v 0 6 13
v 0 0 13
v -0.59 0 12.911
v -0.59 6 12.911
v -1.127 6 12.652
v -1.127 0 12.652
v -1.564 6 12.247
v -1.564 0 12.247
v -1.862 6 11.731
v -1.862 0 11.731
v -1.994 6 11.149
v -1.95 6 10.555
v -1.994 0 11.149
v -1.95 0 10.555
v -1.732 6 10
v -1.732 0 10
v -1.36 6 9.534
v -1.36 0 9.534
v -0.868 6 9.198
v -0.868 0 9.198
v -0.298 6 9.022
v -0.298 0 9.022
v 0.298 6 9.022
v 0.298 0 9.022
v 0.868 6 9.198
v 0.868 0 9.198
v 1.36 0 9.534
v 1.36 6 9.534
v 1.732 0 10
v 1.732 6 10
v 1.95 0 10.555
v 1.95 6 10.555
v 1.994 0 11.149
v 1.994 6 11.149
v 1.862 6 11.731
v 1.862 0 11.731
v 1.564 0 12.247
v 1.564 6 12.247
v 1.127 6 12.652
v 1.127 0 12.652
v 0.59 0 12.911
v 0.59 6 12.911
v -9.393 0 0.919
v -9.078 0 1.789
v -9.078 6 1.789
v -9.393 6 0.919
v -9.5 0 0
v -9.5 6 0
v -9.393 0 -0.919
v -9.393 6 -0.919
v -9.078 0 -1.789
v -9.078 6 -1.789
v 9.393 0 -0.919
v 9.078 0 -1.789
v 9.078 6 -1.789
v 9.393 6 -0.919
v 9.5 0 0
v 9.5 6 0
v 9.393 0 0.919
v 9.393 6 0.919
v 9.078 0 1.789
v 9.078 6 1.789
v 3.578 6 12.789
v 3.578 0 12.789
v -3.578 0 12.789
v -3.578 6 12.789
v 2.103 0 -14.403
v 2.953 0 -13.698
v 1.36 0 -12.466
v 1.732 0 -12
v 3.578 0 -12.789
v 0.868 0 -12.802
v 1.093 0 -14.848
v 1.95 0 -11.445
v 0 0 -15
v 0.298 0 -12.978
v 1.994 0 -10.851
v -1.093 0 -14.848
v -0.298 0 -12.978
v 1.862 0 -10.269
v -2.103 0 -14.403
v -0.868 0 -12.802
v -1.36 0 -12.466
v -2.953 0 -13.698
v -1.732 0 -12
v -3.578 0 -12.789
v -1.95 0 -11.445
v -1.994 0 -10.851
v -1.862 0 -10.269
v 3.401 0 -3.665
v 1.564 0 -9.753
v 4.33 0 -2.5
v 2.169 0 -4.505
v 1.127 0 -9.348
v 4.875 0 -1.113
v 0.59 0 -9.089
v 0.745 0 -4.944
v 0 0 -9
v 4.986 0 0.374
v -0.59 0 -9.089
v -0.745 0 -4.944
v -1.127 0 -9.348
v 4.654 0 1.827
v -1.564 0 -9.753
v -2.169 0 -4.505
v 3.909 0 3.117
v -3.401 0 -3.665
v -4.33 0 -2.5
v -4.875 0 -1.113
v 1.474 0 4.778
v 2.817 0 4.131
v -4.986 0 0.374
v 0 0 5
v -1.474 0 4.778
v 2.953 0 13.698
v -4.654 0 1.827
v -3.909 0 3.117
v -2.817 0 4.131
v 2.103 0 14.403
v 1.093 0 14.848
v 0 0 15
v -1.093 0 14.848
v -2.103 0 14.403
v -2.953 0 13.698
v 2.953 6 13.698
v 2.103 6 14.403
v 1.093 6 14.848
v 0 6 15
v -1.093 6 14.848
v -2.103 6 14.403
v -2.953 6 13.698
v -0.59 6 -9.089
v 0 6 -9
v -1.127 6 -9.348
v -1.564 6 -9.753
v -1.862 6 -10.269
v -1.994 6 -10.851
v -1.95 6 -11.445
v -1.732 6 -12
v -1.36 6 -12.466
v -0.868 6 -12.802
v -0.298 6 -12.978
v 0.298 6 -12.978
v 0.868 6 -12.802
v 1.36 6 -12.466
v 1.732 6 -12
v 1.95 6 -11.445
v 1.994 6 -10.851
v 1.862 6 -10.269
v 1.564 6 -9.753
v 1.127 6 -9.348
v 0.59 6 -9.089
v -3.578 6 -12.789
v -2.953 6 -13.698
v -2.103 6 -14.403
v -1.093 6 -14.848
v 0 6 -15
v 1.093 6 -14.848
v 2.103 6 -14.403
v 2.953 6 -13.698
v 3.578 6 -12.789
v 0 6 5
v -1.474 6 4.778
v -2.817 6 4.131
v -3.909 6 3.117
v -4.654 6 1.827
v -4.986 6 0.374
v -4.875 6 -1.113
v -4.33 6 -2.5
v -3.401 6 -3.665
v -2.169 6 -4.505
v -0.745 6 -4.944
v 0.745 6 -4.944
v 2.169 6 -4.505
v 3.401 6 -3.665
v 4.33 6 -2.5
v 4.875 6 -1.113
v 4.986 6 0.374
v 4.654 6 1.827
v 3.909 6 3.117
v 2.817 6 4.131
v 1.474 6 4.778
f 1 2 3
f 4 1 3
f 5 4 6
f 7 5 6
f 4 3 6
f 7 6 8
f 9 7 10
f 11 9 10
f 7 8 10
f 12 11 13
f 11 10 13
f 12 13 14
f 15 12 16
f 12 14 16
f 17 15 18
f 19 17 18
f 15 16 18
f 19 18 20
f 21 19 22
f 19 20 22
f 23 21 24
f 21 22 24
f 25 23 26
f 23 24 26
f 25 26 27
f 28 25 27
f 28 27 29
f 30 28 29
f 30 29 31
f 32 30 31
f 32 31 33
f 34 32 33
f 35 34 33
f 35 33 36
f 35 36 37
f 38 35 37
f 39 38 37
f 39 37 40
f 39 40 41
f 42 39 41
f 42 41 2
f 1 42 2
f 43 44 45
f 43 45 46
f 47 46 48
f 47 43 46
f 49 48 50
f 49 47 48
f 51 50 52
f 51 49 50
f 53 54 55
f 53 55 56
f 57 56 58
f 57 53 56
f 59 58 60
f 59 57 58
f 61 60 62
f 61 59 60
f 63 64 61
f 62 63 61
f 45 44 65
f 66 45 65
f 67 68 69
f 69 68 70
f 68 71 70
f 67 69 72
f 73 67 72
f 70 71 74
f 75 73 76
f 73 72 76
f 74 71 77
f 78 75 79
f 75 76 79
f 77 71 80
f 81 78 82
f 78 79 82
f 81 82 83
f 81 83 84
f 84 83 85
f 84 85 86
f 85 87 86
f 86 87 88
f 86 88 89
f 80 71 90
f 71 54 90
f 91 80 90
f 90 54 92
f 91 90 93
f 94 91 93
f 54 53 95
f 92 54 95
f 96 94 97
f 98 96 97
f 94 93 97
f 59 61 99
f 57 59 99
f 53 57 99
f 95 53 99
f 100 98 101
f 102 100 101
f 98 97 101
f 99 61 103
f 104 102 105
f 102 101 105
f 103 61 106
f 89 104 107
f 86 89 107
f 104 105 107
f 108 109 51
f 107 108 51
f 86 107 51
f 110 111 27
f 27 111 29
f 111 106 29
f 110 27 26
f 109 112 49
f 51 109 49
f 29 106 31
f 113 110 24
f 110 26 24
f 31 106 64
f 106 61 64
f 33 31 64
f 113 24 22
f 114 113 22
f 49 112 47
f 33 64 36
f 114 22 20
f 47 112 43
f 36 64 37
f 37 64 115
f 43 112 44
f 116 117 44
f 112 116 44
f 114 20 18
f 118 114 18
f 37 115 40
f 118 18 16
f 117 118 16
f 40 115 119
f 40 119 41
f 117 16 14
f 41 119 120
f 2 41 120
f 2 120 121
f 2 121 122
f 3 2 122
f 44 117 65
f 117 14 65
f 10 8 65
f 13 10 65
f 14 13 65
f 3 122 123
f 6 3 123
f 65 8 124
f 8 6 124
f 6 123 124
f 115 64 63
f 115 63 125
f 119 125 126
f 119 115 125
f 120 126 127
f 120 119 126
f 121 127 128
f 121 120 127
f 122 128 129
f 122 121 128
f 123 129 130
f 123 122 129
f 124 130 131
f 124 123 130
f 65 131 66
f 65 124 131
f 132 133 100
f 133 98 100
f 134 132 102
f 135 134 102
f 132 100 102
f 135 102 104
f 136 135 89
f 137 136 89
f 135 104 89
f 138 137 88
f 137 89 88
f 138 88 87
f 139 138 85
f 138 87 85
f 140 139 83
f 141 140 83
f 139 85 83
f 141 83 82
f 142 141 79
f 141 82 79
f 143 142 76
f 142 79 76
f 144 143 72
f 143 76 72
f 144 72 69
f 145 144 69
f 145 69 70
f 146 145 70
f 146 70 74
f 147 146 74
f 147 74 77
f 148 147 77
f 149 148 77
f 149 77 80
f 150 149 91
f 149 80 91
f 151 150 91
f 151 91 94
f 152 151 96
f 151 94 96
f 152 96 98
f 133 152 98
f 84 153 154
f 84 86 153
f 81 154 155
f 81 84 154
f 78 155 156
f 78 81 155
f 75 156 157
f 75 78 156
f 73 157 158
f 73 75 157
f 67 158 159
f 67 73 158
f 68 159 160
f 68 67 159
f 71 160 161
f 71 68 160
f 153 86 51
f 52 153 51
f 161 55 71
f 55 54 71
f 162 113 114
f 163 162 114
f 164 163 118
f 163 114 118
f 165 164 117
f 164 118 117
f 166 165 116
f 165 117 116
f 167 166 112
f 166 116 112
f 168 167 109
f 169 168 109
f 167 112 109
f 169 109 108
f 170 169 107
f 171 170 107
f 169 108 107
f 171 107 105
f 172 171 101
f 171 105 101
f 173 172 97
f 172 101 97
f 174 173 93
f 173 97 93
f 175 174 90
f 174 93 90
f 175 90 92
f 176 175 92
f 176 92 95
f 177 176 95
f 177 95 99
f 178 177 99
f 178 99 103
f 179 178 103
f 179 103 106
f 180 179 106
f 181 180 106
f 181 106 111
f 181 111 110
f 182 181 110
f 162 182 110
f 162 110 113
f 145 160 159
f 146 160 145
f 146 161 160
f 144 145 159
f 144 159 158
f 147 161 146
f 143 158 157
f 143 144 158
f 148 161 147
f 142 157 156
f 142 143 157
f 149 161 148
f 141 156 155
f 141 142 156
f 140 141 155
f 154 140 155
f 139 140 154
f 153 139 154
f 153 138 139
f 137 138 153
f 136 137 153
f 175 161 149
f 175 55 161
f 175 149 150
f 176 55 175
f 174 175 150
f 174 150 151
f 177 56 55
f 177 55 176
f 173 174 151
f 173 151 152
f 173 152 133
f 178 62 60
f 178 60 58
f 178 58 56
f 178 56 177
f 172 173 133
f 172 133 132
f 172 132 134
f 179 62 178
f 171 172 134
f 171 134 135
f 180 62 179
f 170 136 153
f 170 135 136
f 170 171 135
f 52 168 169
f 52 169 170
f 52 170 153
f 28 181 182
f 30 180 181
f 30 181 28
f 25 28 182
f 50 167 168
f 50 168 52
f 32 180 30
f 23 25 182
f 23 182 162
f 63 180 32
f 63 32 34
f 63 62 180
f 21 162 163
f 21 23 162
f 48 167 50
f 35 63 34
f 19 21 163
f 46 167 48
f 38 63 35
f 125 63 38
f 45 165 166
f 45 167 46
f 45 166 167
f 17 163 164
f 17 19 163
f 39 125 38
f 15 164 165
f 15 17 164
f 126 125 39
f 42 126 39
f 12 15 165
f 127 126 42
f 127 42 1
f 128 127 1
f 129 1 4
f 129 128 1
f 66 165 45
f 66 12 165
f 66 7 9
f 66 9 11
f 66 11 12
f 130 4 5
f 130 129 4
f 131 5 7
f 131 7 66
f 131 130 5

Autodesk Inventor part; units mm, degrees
ref_plane "YZ Plane" through (0, 0, 0) normal (1, 0, 0) x (0, 1, 0)
ref_plane "XZ Plane" through (0, 0, 0) normal (0, 1, 0) x (-1, 0, 0)
ref_plane "XY Plane" through (0, 0, 0) normal (0, 0, 1) x (1, 0, 0)
sketch "Skizze1" plane through (0, 0, 0) normal (0, 1, 0) x (-1, 0, 0)
  line L0 (0, 11) -> (0, -11) construction
  line L1 (9.5, 0) -> (-9.5, 0) construction
  arc A0 (3.5777, 12.7889) -> (-3.5777, 12.7889) centre (0, 11) ccw
  arc A1 (-3.5777, -12.7889) -> (3.5777, -12.7889) centre (0, -11) ccw
  arc A2 (9.0777, -1.7889) -> (9.0777, 1.7889) centre (5.5, 0) ccw
  arc A3 (-9.0777, 1.7889) -> (-9.0777, -1.7889) centre (-5.5, 0) ccw
  line L2 (-3.5777, 12.7889) -> (-9.0777, 1.7889)
  line L3 (3.5777, -12.7889) -> (9.0777, -1.7889)
  line L4 (9.0777, 1.7889) -> (3.5777, 12.7889)
  line L5 (-9.0777, -1.7889) -> (-3.5777, -12.7889)
  point P0 (0, 0)
  point P1 (0, 0)
  point P2 (0, -15)
  point P3 (0, 15)
  dimension "d4" = 19
  dimension "d5" = 22
  dimension "d6" = 4
  dimension "d7" = 4
  dimension "d8" = 4
  dimension "d9" = 4
  dimension "d10" = 30
extrude "Extrusion1" add sketch "Skizze1" along normal blind 6
sketch "Skizze2" plane through (0, 6, 0) normal (0, 1, 0) x (1, 0, 0)
  arc A0 (-3.5777, -12.7889) -> (3.5777, -12.7889) centre (0, -11) ccw projected
  arc A1 (3.5777, 12.7889) -> (-3.5777, 12.7889) centre (0, 11) ccw projected
  point P0 (0, 0)
hole "Bohrung1" at (0, 6, 11) at (0, 6, -11) direction (0, -1, 0) diameter 4 depth 6
sketch "Skizze3" plane through (0, 6, 0) normal (0, 1, 0) x (1, 0, 0)
  point P0 (0, 0)
  point P1 (0, 0)
hole "Bohrung2" at (0, 6, 0) direction (0, -1, 0) diameter 10 end through all
equation "\"d6\" = d7"
equation "\"d9\" = d8"
properties part number "1162"
